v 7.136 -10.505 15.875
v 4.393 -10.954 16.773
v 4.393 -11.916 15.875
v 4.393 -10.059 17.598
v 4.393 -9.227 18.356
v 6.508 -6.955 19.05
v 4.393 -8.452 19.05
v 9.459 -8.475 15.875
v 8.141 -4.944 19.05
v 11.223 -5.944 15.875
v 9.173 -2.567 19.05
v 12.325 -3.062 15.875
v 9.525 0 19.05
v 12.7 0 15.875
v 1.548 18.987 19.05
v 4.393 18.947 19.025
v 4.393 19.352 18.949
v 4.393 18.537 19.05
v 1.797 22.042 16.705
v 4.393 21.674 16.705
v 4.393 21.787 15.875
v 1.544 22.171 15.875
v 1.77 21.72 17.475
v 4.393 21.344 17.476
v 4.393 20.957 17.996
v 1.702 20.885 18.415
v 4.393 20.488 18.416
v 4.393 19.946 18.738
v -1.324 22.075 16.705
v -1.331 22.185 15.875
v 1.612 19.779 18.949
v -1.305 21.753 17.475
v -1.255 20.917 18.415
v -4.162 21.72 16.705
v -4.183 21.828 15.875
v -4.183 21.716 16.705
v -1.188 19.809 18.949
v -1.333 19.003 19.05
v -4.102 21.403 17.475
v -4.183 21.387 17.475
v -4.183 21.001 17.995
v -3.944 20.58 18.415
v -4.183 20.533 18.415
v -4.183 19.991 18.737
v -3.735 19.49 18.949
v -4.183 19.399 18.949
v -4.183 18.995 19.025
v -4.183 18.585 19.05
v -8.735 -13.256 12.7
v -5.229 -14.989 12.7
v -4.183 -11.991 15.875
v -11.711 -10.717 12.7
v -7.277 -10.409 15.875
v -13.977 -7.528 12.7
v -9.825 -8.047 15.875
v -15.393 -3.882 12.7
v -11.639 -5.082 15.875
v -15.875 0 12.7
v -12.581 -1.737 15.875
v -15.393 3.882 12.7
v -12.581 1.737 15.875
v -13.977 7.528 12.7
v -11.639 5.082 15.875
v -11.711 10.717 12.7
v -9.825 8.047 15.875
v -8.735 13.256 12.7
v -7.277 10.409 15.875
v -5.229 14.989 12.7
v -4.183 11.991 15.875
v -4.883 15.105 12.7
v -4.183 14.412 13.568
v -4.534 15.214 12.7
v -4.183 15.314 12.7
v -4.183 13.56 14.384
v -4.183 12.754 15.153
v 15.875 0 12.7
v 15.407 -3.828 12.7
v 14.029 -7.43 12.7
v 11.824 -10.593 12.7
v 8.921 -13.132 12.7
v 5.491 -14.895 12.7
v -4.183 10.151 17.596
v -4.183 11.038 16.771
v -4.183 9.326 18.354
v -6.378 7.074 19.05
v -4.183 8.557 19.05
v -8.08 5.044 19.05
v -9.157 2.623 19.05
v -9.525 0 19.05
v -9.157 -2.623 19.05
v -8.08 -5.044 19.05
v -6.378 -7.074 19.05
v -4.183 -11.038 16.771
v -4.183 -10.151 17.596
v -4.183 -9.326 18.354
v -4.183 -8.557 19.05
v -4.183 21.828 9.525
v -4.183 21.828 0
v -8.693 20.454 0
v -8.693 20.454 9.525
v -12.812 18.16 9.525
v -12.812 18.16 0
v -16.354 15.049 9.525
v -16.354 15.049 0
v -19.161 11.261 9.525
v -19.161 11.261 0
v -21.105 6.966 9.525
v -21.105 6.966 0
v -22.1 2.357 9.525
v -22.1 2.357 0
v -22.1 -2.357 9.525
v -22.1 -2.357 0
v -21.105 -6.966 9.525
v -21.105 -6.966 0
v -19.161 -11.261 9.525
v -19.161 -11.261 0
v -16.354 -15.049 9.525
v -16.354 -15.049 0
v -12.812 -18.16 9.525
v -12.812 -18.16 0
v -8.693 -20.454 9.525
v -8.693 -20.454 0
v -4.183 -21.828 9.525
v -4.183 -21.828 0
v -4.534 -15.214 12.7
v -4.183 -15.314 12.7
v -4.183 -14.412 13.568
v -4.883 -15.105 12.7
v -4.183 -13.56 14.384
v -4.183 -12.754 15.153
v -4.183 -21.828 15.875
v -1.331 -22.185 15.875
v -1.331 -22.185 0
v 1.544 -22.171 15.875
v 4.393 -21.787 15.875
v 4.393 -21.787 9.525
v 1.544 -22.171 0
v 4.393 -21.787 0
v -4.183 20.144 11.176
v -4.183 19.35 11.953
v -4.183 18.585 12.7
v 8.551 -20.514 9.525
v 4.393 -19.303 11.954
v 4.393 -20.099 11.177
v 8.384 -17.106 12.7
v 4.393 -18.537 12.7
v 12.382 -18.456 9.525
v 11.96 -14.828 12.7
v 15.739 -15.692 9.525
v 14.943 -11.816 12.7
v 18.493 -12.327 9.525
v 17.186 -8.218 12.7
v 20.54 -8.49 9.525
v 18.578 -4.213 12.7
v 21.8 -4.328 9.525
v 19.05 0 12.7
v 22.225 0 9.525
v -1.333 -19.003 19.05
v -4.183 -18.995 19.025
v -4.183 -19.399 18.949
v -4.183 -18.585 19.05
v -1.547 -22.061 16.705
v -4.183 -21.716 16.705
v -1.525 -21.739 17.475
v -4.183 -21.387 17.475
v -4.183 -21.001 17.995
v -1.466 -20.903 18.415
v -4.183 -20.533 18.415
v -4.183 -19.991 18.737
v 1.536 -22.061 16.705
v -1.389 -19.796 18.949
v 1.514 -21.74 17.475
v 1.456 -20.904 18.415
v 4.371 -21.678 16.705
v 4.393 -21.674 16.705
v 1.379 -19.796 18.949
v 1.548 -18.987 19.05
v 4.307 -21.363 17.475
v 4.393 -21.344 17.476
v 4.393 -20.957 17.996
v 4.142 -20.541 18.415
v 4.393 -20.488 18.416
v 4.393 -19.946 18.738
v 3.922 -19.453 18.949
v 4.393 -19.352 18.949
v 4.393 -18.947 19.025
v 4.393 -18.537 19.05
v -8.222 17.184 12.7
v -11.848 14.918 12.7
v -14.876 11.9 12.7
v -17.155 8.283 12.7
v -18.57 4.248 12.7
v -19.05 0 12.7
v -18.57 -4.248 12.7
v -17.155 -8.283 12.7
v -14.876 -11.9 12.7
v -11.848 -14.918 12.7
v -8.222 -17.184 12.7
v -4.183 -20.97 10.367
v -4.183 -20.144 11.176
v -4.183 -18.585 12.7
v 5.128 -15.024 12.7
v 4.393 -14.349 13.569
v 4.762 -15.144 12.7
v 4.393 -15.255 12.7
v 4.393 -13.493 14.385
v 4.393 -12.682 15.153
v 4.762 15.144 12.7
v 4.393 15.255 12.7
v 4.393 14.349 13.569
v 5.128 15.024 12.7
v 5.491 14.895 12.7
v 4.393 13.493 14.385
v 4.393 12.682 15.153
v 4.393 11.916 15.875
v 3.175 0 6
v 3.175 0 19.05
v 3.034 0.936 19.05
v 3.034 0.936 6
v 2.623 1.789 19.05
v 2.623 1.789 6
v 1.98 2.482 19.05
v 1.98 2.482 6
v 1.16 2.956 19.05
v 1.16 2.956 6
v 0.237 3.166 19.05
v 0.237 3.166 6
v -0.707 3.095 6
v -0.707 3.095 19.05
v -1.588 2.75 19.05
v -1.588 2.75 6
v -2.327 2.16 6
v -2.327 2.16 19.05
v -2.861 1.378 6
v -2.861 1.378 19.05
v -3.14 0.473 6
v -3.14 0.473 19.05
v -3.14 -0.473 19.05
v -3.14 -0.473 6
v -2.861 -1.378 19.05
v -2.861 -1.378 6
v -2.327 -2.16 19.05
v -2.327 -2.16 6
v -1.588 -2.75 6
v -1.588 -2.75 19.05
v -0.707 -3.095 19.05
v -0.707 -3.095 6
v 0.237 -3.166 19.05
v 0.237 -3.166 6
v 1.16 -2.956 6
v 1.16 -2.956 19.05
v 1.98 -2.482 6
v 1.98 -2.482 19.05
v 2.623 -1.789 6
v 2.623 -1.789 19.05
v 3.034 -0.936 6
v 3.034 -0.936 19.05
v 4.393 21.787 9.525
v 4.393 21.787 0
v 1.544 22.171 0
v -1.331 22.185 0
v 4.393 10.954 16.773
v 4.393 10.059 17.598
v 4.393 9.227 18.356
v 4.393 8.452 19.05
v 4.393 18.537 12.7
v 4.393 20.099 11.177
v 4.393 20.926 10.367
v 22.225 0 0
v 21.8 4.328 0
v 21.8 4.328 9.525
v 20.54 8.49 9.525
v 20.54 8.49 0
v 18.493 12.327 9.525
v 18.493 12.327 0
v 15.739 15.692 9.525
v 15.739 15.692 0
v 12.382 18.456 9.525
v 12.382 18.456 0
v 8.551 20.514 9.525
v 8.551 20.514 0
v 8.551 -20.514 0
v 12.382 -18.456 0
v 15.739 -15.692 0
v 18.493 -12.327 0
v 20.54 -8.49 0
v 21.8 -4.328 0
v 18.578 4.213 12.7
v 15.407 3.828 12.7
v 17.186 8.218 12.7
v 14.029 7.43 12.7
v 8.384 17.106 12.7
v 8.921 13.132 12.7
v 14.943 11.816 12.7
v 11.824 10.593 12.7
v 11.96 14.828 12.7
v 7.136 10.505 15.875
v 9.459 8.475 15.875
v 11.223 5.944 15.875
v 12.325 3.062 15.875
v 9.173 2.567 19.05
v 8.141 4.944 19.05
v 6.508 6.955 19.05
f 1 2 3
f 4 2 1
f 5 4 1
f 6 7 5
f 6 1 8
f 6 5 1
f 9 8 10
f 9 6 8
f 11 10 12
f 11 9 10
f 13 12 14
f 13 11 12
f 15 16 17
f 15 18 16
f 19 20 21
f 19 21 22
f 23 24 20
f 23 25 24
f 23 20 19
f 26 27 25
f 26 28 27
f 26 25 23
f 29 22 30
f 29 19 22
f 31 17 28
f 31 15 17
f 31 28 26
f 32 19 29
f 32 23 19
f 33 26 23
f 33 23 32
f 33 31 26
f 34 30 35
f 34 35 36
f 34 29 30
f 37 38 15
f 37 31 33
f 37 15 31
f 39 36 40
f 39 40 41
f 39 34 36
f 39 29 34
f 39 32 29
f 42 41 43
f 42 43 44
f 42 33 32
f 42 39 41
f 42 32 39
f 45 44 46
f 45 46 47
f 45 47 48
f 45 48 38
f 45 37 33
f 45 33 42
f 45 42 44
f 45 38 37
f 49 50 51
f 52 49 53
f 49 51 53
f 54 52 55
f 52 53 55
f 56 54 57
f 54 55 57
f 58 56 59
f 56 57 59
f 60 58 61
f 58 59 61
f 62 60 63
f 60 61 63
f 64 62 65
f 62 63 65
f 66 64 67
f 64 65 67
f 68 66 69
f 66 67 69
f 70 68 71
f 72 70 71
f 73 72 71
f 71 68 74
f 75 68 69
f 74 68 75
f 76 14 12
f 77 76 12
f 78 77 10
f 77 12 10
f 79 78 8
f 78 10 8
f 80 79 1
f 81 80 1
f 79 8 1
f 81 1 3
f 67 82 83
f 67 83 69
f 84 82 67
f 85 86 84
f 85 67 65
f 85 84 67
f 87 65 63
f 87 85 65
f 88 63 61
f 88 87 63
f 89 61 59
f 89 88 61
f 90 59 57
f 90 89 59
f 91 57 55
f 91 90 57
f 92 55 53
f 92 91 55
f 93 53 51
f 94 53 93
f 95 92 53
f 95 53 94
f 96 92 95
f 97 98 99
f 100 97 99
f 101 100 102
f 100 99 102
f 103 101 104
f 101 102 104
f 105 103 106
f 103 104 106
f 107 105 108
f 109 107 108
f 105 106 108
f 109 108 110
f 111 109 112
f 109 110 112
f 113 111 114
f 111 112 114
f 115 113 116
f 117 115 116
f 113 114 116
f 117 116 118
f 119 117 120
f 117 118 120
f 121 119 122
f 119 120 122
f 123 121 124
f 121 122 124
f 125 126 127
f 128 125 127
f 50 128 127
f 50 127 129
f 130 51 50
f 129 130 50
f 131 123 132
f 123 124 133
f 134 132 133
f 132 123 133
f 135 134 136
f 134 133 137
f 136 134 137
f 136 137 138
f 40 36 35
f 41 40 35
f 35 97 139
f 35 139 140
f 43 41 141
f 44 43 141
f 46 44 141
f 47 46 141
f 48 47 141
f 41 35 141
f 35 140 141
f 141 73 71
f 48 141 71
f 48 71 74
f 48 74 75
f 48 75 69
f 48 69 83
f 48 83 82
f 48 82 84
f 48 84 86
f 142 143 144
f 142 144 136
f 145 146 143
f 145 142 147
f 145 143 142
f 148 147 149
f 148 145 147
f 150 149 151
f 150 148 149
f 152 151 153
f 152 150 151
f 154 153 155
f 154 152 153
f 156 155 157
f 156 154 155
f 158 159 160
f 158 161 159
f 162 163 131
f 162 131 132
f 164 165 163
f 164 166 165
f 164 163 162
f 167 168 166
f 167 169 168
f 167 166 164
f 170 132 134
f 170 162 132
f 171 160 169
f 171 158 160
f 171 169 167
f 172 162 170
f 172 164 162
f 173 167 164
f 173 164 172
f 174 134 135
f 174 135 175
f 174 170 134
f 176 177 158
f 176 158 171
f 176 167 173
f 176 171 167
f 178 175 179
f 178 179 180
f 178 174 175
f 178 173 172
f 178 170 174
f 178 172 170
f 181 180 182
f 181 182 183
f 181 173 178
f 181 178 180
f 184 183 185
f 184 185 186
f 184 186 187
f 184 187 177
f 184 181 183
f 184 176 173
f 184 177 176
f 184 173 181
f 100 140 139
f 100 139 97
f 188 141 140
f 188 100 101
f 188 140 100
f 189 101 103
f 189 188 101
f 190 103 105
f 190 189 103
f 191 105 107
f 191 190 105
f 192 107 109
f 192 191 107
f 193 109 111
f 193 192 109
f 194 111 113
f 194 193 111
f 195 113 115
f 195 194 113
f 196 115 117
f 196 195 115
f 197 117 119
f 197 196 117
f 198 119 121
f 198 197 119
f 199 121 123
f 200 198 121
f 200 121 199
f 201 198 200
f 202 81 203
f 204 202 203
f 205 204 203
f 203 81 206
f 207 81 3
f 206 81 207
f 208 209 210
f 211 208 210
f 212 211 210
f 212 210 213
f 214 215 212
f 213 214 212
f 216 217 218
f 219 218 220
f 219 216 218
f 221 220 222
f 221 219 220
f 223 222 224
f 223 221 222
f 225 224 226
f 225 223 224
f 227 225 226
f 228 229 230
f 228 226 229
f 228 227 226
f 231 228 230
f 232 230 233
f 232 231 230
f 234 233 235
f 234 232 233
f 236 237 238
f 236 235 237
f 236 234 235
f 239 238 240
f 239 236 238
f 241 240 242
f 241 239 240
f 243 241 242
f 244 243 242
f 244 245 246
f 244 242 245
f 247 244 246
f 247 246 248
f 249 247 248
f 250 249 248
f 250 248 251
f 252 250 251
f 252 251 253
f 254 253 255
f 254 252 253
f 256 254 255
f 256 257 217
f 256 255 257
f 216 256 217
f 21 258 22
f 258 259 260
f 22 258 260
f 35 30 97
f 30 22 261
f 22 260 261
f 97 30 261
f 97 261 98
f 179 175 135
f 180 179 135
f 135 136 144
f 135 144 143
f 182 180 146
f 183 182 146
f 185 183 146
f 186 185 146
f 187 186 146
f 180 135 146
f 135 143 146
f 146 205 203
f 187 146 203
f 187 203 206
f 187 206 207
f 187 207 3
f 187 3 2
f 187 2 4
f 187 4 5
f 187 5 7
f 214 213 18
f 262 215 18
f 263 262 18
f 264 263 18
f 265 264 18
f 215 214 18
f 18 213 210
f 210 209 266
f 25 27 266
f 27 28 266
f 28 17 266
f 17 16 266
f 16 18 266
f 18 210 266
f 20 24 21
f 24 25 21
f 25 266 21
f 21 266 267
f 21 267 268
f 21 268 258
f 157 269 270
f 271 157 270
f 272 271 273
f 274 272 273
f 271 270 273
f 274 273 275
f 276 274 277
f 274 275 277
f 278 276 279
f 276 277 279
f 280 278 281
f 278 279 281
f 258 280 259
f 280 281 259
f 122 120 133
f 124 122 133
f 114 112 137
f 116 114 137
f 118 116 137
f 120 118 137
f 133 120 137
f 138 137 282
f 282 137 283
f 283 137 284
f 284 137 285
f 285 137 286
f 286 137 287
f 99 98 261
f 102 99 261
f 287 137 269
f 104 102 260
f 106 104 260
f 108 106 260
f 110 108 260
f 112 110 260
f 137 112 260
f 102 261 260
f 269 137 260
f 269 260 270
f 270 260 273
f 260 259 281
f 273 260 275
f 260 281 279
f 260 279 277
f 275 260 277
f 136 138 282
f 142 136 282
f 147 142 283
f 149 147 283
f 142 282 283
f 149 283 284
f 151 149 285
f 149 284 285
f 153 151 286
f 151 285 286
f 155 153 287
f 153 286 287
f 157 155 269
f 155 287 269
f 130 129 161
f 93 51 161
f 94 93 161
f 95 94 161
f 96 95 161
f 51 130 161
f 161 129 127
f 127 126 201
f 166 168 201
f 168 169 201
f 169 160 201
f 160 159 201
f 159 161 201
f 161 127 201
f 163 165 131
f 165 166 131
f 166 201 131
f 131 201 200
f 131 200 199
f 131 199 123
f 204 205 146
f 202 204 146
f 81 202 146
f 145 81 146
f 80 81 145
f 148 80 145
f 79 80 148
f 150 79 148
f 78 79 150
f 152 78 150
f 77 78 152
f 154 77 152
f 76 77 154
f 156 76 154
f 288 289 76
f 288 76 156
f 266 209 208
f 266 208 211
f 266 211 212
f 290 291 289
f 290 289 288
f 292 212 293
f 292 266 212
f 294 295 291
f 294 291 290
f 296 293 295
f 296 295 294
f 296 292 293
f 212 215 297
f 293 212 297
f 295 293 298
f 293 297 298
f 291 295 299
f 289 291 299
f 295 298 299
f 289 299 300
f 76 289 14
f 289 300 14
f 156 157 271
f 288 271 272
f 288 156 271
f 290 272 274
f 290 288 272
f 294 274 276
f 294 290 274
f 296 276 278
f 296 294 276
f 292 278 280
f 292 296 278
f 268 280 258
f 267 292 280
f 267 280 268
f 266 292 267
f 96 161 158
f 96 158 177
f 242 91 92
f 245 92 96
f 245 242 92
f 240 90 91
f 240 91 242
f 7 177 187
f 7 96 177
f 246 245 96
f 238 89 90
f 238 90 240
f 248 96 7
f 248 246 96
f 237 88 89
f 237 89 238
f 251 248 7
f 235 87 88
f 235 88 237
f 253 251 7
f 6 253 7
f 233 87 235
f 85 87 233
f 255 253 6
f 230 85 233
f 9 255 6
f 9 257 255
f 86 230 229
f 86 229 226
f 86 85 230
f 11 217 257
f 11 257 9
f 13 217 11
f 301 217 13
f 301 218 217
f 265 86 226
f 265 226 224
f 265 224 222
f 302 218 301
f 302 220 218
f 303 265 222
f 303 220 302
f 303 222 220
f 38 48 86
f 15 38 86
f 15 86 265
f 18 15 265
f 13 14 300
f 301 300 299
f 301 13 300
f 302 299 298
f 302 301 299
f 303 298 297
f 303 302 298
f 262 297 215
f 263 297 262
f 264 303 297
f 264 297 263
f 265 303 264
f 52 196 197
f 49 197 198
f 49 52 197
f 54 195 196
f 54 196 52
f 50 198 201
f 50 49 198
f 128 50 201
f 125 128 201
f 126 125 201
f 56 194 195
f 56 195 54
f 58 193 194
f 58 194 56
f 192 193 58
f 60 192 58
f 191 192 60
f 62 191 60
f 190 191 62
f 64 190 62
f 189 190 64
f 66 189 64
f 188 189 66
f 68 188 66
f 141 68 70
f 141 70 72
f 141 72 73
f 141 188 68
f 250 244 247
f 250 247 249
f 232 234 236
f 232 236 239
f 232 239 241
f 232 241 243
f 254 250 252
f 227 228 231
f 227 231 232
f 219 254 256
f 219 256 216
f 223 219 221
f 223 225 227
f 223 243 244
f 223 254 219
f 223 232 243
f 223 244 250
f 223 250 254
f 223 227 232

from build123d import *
from build123d import SkipClean  # not in build123d's __all__

# Parameters (mm, degrees)
F0_R     = 3.175
F1_DEPTH = 12.7
F2_DEPTH = 19.05
F3_SIZE  = 3.17499
F4_DEPTH = 19.05
F5_R     = 3.175
F6_START = 6
F6_DEPTH = 15


# Not quite as in the source:
# - a fillet or chamfer is up to 0.001 mm smaller than in the source, because OpenCascade refuses the exact size


with BuildPart() as f1:
    # F0 (on Top) → F1 (new body)
    with BuildSketch(Plane.XY):
        with BuildLine():
            Line((-4.1830006975, 11.9913512652), (-4.1830006975, 21.8278063526))
            ThreePointArc((-4.1830006975, 21.8278063526), (-22.225, 0), (-4.1830006975, -21.8278063526))
            Line((-4.1830006975, -21.8278063526), (-4.1830006975, -11.9913512652))
            ThreePointArc((-4.1830006975, -11.9913512652), (-12.7, 0), (-4.1830006975, 11.9913512652))
        make_face()
        with BuildLine():
            ThreePointArc((4.3927960263, -21.7865547545), (17.1985539608, -14.0769445072), (22.225, 0))
            ThreePointArc((22.225, 0), (17.1985539608, 14.0769445072), (4.3927960263, 21.7865547545))
            Line((4.3927960263, 21.7865547545), (4.3927960263, 11.916095966))
            ThreePointArc((4.3927960263, 11.916095966), (10.4182174467, 7.2629708269), (12.7, 0))
            ThreePointArc((12.7, 0), (10.4182174467, -7.2629708269), (4.3927960263, -11.916095966))
            Line((4.3927960263, -11.916095966), (4.3927960263, -21.7865547545))
        make_face()
        with BuildLine():
            Line((4.3927960263, -11.916095966), (4.3927960263, 11.916095966))
            ThreePointArc((4.3927960263, 11.916095966), (0.1114421824, 12.6995110394), (-4.1830006975, 11.9913512652))
            Line((-4.1830006975, 11.9913512652), (-4.1830006975, -11.9913512652))
            ThreePointArc((-4.1830006975, -11.9913512652), (0.1114421824, -12.6995110394), (4.3927960263, -11.916095966))
        make_face()
        Circle(F0_R, mode=Mode.SUBTRACT)
        with BuildLine():
            Line((-4.1830006975, -11.9913512652), (-4.1830006975, 11.9913512652))
            ThreePointArc((-4.1830006975, 11.9913512652), (-12.7, 0), (-4.1830006975, -11.9913512652))
        make_face()
        with BuildLine():
            ThreePointArc((12.7, 0), (10.4182174467, 7.2629708269), (4.3927960263, 11.916095966))
            Line((4.3927960263, 11.916095966), (4.3927960263, -11.916095966))
            ThreePointArc((4.3927960263, -11.916095966), (10.4182174467, -7.2629708269), (12.7, 0))
        make_face()
        with BuildLine():
            Line((4.3927960263, 11.916095966), (4.3927960263, 21.7865547545))
            ThreePointArc((4.3927960263, 21.7865547545), (0.1069062374, 22.2247428794), (-4.1830006975, 21.8278063526))
            Line((-4.1830006975, 21.8278063526), (-4.1830006975, 11.9913512652))
            ThreePointArc((-4.1830006975, 11.9913512652), (0.1114421824, 12.6995110394), (4.3927960263, 11.916095966))
        make_face()
        with BuildLine():
            ThreePointArc((-4.1830006975, -21.8278063526), (0.1069062374, -22.2247428794), (4.3927960263, -21.7865547545))
            Line((4.3927960263, -21.7865547545), (4.3927960263, -11.916095966))
            ThreePointArc((4.3927960263, -11.916095966), (0.1114421824, -12.6995110394), (-4.1830006975, -11.9913512652))
            Line((-4.1830006975, -11.9913512652), (-4.1830006975, -21.8278063526))
        make_face()
        Circle(F0_R)
    extrude(amount=F1_DEPTH)

    # F0 (on Top) → F2 (join)
    with BuildSketch(Plane.XY):
        with BuildLine():
            ThreePointArc((12.7, 0), (10.4182174467, 7.2629708269), (4.3927960263, 11.916095966))
            Line((4.3927960263, 11.916095966), (4.3927960263, -11.916095966))
            ThreePointArc((4.3927960263, -11.916095966), (10.4182174467, -7.2629708269), (12.7, 0))
        make_face()
        with BuildLine():
            Line((-4.1830006975, -11.9913512652), (-4.1830006975, 11.9913512652))
            ThreePointArc((-4.1830006975, 11.9913512652), (-12.7, 0), (-4.1830006975, -11.9913512652))
        make_face()
        with BuildLine():
            Line((4.3927960263, -11.916095966), (4.3927960263, 11.916095966))
            ThreePointArc((4.3927960263, 11.916095966), (0.1114421824, 12.6995110394), (-4.1830006975, 11.9913512652))
            Line((-4.1830006975, 11.9913512652), (-4.1830006975, -11.9913512652))
            ThreePointArc((-4.1830006975, -11.9913512652), (0.1114421824, -12.6995110394), (4.3927960263, -11.916095966))
        make_face()
        Circle(F0_R, mode=Mode.SUBTRACT)
        Circle(F0_R)
    extrude(amount=F2_DEPTH)

    # F3 (size 3.175 in the source; OpenCascade refuses exactly that, so slightly less here)
    f3_edges = [f1.edges().sort_by_distance(p)[0] for p in [
        (4.183001, -21.827806, 12.7),
        (-4.392796, -11.916096, 12.7),
        (-4.392796, -11.916096, 19.05),
    ]]
    chamfer(f3_edges, length=F3_SIZE)

    # F0 (on Top) → F4 (join)
    with BuildSketch(Plane.XY):
        with BuildLine():
            Line((4.3927960263, 11.916095966), (4.3927960263, 21.7865547545))
            ThreePointArc((4.3927960263, 21.7865547545), (0.1069062374, 22.2247428794), (-4.1830006975, 21.8278063526))
            Line((-4.1830006975, 21.8278063526), (-4.1830006975, 11.9913512652))
            ThreePointArc((-4.1830006975, 11.9913512652), (0.1114421824, 12.6995110394), (4.3927960263, 11.916095966))
        make_face()
        with BuildLine():
            Line((4.3927960263, -11.916095966), (4.3927960263, 11.916095966))
            ThreePointArc((4.3927960263, 11.916095966), (0.1114421824, 12.6995110394), (-4.1830006975, 11.9913512652))
            Line((-4.1830006975, 11.9913512652), (-4.1830006975, -11.9913512652))
            ThreePointArc((-4.1830006975, -11.9913512652), (0.1114421824, -12.6995110394), (4.3927960263, -11.916095966))
        make_face()
        Circle(F0_R, mode=Mode.SUBTRACT)
        with BuildLine():
            ThreePointArc((-4.1830006975, -21.8278063526), (0.1069062374, -22.2247428794), (4.3927960263, -21.7865547545))
            Line((4.3927960263, -21.7865547545), (4.3927960263, -11.916095966))
            ThreePointArc((4.3927960263, -11.916095966), (0.1114421824, -12.6995110394), (-4.1830006975, -11.9913512652))
            Line((-4.1830006975, -11.9913512652), (-4.1830006975, -21.8278063526))
        make_face()
    with SkipClean():  # cleaning this boolean's faces spoils the solid; the shape is the same uncleaned
        extrude(amount=F4_DEPTH)

    # F5
    f5_edges = [f1.edges().sort_by_distance(p)[0] for p in [
        (0.106906, -22.224743, 19.05),
        (0.106906, 22.224743, 19.05),
    ]]
    fillet(f5_edges, radius=F5_R)

    # F0 (on Top) → F6 (cut)
    with BuildSketch(Plane.XY.offset(F6_START)):
        Circle(F0_R)
    extrude(amount=F6_DEPTH, mode=Mode.SUBTRACT)


solid = f1.part
